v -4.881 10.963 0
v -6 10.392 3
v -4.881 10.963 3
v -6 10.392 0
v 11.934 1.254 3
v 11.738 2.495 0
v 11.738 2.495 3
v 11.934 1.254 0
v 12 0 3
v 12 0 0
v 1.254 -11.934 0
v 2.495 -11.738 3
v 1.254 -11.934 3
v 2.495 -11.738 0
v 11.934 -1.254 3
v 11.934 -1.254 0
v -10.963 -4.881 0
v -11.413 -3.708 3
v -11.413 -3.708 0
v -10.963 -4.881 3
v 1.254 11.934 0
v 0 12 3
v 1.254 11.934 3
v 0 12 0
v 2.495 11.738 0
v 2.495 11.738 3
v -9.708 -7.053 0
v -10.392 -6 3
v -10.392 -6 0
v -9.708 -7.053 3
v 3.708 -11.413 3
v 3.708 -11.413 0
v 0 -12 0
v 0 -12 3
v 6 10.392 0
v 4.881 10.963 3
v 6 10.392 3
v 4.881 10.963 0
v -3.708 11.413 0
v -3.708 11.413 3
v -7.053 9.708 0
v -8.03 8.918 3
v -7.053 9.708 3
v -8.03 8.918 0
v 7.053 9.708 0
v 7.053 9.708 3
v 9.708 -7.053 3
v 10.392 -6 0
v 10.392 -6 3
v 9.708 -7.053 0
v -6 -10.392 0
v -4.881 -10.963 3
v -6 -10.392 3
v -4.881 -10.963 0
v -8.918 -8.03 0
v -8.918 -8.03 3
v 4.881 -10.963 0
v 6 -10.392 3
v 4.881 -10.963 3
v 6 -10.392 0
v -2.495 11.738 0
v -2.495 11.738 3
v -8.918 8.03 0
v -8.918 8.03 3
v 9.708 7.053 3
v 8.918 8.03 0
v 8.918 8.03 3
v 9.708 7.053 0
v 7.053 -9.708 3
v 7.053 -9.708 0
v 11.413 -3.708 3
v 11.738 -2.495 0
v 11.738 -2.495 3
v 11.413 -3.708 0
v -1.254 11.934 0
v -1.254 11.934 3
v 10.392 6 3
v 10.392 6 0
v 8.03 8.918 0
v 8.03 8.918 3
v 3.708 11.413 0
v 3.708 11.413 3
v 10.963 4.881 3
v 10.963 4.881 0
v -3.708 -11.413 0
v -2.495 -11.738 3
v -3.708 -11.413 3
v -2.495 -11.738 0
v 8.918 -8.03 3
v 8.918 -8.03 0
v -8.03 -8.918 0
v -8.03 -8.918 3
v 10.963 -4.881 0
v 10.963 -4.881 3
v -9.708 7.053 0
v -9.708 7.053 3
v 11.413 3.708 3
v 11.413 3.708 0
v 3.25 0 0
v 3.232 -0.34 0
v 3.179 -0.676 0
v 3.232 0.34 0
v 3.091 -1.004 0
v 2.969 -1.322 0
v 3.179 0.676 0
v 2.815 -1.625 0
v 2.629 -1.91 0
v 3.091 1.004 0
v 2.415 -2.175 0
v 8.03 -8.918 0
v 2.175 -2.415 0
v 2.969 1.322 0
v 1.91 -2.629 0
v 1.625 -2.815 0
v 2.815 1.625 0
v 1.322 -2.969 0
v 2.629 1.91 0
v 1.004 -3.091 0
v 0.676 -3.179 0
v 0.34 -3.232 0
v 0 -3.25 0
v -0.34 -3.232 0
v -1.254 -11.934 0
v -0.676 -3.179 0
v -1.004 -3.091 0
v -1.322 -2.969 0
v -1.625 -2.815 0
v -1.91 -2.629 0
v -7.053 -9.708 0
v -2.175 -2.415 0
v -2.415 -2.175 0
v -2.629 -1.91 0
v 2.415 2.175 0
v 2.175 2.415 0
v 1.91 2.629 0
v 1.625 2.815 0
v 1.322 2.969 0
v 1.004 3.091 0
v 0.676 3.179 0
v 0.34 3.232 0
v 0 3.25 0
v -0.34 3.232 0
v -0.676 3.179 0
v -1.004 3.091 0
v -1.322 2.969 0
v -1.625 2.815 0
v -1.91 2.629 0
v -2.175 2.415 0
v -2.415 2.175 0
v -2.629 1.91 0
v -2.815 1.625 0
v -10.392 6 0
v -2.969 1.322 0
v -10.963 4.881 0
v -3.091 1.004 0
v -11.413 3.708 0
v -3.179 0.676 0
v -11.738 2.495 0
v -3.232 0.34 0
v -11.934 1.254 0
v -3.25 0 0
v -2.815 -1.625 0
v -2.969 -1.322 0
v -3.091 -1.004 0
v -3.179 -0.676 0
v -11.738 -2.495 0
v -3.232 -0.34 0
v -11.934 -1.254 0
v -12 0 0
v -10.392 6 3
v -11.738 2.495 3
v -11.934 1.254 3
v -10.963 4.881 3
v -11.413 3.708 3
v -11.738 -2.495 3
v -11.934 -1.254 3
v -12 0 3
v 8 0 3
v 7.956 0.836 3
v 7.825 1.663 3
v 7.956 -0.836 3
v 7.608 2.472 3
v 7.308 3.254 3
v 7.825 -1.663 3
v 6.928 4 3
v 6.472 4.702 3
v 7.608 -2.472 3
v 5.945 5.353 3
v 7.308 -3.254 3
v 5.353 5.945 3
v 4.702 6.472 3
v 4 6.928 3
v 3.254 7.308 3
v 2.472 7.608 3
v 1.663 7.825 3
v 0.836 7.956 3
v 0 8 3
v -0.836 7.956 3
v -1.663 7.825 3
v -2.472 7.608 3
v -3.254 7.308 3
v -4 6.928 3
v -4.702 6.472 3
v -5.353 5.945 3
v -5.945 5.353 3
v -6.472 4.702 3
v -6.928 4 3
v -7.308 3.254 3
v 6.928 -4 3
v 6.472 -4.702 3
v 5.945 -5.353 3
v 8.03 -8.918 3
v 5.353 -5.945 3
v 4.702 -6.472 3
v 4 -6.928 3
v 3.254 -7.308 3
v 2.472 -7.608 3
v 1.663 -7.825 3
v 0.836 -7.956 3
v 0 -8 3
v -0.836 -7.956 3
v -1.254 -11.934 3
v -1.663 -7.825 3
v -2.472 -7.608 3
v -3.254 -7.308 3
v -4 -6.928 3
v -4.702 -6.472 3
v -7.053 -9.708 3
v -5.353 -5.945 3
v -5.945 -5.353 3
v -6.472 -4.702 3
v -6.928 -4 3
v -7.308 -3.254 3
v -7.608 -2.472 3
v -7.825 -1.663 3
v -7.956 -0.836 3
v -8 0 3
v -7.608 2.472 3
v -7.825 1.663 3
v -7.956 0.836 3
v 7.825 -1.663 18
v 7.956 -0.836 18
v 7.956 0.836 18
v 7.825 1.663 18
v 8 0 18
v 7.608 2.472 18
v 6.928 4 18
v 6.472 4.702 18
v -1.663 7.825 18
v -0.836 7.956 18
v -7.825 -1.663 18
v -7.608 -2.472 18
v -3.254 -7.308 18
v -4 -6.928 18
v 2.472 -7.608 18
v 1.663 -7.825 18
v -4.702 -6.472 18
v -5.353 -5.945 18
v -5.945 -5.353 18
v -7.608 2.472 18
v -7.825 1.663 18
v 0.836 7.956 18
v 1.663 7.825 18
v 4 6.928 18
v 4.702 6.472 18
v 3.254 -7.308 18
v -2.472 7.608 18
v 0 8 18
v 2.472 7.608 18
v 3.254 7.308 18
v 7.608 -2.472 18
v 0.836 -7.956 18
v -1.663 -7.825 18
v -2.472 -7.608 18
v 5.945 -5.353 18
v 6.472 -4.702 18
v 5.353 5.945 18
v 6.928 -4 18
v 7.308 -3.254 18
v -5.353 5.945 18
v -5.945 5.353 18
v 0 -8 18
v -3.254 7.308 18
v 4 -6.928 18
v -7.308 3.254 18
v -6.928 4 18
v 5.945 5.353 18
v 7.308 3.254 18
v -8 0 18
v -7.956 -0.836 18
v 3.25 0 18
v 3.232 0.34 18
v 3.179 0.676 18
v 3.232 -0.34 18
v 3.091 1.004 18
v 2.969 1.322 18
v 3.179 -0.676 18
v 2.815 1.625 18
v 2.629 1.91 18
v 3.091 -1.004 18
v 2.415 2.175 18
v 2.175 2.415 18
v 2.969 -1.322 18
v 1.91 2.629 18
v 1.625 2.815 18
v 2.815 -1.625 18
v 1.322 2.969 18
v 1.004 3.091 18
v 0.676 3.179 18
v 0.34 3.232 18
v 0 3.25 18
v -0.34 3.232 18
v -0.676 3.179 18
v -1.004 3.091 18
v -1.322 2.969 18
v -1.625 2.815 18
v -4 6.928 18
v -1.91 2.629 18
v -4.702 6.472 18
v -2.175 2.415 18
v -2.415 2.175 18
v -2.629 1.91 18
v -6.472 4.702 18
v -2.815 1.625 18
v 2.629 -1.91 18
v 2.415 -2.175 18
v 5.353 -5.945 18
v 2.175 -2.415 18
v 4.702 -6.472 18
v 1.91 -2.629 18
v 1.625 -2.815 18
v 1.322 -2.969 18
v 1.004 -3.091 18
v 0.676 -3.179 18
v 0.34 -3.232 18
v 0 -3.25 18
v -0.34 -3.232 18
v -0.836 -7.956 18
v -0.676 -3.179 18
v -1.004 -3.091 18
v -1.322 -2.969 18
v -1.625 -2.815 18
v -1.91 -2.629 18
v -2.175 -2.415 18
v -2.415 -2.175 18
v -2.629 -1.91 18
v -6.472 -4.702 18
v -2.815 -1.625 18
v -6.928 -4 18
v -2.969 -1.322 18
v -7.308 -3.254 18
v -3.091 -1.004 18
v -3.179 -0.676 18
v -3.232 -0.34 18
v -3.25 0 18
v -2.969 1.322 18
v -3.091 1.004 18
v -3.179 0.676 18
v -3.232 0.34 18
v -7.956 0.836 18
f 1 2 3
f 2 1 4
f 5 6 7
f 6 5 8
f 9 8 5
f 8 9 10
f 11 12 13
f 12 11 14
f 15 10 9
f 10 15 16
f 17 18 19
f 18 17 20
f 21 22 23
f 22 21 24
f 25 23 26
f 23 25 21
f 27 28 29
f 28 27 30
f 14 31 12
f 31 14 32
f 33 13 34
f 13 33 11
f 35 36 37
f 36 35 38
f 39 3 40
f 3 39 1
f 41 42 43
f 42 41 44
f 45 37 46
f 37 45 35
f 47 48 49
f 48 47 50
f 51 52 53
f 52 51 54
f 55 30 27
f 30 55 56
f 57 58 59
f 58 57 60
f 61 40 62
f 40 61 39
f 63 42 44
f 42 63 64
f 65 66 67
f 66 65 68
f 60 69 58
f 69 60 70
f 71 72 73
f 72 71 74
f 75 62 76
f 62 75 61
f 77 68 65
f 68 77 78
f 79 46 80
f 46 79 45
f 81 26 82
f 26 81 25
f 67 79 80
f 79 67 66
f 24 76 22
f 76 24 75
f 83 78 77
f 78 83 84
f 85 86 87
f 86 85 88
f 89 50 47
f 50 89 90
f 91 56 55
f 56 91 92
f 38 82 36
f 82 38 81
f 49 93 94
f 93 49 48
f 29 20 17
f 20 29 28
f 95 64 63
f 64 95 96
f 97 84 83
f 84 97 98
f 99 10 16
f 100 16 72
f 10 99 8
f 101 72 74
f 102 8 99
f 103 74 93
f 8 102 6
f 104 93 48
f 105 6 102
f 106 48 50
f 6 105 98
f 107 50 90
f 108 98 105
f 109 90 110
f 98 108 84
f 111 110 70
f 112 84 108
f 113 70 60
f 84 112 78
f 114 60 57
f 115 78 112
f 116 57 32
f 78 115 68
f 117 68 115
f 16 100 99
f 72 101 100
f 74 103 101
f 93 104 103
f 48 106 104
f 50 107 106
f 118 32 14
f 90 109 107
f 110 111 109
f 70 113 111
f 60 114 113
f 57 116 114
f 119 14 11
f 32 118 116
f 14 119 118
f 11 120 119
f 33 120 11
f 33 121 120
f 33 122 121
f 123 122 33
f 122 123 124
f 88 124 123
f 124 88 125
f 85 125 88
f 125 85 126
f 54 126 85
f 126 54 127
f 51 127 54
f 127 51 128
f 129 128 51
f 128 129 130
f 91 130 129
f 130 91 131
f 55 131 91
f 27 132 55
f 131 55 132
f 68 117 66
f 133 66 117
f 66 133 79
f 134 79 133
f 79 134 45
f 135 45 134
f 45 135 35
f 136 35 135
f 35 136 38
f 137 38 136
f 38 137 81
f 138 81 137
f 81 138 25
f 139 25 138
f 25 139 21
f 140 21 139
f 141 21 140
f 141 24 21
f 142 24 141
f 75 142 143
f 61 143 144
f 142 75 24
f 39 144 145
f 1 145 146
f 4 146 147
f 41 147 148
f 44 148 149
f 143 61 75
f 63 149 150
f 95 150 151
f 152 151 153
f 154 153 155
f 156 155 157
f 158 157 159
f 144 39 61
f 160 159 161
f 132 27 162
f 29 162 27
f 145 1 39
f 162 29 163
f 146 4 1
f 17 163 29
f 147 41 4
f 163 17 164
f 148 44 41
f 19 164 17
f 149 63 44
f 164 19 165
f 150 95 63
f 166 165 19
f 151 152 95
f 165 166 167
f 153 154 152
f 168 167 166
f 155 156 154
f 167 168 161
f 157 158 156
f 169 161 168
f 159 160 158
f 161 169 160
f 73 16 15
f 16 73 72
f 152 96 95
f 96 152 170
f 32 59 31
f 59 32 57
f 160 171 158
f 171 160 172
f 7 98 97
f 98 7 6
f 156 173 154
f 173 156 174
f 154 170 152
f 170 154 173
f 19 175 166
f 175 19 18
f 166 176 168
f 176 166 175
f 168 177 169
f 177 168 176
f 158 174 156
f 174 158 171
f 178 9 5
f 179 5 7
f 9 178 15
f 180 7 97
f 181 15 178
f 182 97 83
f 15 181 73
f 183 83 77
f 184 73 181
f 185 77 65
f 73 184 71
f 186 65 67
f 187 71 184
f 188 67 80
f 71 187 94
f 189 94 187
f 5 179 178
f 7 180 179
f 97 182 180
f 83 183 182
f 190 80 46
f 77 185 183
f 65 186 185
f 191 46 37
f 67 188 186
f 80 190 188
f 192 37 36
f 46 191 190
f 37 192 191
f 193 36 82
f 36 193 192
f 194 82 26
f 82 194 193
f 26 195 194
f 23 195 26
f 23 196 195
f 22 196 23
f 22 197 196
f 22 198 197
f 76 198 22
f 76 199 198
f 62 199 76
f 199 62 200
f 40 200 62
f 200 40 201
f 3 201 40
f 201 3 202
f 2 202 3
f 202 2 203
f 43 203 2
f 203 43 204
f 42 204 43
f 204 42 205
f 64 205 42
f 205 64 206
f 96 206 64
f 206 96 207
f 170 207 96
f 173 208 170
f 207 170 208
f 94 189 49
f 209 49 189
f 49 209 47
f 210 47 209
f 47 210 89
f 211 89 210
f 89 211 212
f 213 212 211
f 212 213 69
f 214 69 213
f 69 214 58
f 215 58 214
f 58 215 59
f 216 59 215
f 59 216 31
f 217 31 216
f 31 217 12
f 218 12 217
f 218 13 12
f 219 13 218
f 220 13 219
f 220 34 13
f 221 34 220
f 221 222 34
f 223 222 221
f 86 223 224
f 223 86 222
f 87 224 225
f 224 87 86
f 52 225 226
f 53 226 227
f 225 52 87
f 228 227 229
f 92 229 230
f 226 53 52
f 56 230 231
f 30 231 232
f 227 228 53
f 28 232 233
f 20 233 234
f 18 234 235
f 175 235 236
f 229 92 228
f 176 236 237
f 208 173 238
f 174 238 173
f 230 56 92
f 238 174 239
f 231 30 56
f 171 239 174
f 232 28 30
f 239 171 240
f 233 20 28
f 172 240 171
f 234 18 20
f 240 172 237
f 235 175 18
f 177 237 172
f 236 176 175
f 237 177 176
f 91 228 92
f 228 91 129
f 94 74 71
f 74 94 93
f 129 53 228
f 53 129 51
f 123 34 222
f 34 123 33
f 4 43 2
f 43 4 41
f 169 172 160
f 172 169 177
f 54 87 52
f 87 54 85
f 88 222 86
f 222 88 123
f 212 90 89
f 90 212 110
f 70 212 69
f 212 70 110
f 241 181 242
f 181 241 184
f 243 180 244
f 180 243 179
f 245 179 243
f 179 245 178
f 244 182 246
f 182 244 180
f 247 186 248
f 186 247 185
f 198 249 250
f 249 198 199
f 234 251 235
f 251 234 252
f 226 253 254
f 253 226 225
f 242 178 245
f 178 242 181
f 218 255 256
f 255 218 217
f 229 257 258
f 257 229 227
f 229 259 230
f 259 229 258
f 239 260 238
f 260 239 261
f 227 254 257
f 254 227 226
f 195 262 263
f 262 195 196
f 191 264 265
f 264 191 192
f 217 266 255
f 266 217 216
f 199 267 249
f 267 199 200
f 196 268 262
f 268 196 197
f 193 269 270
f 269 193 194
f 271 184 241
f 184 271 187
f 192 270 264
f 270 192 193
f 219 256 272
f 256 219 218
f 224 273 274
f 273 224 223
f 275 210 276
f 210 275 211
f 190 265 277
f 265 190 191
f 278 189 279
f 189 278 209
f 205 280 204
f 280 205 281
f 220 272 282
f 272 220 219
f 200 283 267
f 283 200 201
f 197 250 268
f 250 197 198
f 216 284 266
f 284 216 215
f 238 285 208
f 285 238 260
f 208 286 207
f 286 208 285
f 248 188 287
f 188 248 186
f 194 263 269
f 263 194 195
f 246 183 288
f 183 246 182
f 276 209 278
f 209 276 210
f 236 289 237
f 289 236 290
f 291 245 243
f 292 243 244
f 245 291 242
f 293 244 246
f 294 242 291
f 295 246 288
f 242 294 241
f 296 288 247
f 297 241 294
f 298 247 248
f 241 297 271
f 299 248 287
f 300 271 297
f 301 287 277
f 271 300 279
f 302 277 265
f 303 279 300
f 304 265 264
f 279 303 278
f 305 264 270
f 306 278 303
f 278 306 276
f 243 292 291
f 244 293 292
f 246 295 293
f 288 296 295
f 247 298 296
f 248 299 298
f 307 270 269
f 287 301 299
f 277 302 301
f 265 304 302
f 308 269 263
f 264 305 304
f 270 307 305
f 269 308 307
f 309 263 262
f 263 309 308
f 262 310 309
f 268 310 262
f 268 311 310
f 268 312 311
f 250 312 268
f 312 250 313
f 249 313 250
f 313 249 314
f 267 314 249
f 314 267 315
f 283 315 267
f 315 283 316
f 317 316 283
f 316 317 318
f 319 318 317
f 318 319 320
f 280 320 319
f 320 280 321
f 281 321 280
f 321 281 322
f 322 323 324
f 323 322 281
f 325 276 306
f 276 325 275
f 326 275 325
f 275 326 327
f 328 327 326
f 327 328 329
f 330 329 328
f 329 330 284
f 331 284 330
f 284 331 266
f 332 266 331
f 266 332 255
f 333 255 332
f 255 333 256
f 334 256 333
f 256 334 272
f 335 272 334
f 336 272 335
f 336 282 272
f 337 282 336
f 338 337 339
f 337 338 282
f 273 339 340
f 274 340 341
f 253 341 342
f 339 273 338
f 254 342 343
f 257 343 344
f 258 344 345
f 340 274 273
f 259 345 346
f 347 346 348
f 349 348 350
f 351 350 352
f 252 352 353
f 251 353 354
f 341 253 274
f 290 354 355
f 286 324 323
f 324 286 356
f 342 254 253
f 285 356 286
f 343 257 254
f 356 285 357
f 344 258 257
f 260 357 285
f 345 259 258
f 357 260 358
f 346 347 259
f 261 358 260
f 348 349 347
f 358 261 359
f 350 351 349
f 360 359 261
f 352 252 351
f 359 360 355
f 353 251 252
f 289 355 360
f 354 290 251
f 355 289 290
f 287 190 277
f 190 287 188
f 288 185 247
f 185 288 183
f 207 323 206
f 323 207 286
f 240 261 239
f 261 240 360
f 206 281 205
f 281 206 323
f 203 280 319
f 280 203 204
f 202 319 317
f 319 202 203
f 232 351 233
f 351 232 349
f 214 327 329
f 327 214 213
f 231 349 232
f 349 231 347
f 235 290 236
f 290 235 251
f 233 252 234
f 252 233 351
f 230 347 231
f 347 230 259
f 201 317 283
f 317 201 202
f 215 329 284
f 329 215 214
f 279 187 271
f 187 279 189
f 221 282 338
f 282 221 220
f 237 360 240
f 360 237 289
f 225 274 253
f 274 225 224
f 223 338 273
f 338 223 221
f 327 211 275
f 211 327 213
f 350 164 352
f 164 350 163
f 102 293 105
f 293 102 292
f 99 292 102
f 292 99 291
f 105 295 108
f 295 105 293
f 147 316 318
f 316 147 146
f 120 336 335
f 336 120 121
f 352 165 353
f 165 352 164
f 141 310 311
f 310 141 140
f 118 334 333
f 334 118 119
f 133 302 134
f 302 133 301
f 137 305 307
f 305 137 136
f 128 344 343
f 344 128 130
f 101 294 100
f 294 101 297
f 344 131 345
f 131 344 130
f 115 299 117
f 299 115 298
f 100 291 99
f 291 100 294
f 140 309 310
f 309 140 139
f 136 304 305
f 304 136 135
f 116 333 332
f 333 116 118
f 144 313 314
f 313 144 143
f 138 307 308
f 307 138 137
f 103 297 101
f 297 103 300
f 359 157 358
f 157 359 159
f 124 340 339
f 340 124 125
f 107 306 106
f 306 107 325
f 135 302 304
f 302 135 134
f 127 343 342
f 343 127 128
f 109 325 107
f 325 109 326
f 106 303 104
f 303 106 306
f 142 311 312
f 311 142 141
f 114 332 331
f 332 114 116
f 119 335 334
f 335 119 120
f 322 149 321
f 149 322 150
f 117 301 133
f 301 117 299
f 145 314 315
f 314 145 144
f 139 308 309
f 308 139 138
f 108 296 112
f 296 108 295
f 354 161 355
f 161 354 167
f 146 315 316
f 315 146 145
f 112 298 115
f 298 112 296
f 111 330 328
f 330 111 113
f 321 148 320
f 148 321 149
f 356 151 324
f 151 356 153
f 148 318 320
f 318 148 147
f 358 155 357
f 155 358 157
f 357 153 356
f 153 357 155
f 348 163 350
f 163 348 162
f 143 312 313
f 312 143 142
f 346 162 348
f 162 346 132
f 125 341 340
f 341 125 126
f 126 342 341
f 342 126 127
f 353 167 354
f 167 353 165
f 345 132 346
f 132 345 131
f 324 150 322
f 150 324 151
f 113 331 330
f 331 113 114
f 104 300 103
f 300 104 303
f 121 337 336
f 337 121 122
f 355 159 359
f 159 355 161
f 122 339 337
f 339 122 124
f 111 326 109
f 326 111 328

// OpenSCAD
// Cable gland body for 6 mm cable.
$fn = 60;
eps = 0.02;
cable_d = 6;
body_d = 16;
body_l = 18;
flange_d = body_d + 8;
flange_t = 3;
difference() {
    union() { cylinder(d = flange_d, h = flange_t); cylinder(d = body_d, h = body_l); }
    translate([0, 0, -eps]) cylinder(d = cable_d + 0.5, h = body_l + 2 * eps);
}
